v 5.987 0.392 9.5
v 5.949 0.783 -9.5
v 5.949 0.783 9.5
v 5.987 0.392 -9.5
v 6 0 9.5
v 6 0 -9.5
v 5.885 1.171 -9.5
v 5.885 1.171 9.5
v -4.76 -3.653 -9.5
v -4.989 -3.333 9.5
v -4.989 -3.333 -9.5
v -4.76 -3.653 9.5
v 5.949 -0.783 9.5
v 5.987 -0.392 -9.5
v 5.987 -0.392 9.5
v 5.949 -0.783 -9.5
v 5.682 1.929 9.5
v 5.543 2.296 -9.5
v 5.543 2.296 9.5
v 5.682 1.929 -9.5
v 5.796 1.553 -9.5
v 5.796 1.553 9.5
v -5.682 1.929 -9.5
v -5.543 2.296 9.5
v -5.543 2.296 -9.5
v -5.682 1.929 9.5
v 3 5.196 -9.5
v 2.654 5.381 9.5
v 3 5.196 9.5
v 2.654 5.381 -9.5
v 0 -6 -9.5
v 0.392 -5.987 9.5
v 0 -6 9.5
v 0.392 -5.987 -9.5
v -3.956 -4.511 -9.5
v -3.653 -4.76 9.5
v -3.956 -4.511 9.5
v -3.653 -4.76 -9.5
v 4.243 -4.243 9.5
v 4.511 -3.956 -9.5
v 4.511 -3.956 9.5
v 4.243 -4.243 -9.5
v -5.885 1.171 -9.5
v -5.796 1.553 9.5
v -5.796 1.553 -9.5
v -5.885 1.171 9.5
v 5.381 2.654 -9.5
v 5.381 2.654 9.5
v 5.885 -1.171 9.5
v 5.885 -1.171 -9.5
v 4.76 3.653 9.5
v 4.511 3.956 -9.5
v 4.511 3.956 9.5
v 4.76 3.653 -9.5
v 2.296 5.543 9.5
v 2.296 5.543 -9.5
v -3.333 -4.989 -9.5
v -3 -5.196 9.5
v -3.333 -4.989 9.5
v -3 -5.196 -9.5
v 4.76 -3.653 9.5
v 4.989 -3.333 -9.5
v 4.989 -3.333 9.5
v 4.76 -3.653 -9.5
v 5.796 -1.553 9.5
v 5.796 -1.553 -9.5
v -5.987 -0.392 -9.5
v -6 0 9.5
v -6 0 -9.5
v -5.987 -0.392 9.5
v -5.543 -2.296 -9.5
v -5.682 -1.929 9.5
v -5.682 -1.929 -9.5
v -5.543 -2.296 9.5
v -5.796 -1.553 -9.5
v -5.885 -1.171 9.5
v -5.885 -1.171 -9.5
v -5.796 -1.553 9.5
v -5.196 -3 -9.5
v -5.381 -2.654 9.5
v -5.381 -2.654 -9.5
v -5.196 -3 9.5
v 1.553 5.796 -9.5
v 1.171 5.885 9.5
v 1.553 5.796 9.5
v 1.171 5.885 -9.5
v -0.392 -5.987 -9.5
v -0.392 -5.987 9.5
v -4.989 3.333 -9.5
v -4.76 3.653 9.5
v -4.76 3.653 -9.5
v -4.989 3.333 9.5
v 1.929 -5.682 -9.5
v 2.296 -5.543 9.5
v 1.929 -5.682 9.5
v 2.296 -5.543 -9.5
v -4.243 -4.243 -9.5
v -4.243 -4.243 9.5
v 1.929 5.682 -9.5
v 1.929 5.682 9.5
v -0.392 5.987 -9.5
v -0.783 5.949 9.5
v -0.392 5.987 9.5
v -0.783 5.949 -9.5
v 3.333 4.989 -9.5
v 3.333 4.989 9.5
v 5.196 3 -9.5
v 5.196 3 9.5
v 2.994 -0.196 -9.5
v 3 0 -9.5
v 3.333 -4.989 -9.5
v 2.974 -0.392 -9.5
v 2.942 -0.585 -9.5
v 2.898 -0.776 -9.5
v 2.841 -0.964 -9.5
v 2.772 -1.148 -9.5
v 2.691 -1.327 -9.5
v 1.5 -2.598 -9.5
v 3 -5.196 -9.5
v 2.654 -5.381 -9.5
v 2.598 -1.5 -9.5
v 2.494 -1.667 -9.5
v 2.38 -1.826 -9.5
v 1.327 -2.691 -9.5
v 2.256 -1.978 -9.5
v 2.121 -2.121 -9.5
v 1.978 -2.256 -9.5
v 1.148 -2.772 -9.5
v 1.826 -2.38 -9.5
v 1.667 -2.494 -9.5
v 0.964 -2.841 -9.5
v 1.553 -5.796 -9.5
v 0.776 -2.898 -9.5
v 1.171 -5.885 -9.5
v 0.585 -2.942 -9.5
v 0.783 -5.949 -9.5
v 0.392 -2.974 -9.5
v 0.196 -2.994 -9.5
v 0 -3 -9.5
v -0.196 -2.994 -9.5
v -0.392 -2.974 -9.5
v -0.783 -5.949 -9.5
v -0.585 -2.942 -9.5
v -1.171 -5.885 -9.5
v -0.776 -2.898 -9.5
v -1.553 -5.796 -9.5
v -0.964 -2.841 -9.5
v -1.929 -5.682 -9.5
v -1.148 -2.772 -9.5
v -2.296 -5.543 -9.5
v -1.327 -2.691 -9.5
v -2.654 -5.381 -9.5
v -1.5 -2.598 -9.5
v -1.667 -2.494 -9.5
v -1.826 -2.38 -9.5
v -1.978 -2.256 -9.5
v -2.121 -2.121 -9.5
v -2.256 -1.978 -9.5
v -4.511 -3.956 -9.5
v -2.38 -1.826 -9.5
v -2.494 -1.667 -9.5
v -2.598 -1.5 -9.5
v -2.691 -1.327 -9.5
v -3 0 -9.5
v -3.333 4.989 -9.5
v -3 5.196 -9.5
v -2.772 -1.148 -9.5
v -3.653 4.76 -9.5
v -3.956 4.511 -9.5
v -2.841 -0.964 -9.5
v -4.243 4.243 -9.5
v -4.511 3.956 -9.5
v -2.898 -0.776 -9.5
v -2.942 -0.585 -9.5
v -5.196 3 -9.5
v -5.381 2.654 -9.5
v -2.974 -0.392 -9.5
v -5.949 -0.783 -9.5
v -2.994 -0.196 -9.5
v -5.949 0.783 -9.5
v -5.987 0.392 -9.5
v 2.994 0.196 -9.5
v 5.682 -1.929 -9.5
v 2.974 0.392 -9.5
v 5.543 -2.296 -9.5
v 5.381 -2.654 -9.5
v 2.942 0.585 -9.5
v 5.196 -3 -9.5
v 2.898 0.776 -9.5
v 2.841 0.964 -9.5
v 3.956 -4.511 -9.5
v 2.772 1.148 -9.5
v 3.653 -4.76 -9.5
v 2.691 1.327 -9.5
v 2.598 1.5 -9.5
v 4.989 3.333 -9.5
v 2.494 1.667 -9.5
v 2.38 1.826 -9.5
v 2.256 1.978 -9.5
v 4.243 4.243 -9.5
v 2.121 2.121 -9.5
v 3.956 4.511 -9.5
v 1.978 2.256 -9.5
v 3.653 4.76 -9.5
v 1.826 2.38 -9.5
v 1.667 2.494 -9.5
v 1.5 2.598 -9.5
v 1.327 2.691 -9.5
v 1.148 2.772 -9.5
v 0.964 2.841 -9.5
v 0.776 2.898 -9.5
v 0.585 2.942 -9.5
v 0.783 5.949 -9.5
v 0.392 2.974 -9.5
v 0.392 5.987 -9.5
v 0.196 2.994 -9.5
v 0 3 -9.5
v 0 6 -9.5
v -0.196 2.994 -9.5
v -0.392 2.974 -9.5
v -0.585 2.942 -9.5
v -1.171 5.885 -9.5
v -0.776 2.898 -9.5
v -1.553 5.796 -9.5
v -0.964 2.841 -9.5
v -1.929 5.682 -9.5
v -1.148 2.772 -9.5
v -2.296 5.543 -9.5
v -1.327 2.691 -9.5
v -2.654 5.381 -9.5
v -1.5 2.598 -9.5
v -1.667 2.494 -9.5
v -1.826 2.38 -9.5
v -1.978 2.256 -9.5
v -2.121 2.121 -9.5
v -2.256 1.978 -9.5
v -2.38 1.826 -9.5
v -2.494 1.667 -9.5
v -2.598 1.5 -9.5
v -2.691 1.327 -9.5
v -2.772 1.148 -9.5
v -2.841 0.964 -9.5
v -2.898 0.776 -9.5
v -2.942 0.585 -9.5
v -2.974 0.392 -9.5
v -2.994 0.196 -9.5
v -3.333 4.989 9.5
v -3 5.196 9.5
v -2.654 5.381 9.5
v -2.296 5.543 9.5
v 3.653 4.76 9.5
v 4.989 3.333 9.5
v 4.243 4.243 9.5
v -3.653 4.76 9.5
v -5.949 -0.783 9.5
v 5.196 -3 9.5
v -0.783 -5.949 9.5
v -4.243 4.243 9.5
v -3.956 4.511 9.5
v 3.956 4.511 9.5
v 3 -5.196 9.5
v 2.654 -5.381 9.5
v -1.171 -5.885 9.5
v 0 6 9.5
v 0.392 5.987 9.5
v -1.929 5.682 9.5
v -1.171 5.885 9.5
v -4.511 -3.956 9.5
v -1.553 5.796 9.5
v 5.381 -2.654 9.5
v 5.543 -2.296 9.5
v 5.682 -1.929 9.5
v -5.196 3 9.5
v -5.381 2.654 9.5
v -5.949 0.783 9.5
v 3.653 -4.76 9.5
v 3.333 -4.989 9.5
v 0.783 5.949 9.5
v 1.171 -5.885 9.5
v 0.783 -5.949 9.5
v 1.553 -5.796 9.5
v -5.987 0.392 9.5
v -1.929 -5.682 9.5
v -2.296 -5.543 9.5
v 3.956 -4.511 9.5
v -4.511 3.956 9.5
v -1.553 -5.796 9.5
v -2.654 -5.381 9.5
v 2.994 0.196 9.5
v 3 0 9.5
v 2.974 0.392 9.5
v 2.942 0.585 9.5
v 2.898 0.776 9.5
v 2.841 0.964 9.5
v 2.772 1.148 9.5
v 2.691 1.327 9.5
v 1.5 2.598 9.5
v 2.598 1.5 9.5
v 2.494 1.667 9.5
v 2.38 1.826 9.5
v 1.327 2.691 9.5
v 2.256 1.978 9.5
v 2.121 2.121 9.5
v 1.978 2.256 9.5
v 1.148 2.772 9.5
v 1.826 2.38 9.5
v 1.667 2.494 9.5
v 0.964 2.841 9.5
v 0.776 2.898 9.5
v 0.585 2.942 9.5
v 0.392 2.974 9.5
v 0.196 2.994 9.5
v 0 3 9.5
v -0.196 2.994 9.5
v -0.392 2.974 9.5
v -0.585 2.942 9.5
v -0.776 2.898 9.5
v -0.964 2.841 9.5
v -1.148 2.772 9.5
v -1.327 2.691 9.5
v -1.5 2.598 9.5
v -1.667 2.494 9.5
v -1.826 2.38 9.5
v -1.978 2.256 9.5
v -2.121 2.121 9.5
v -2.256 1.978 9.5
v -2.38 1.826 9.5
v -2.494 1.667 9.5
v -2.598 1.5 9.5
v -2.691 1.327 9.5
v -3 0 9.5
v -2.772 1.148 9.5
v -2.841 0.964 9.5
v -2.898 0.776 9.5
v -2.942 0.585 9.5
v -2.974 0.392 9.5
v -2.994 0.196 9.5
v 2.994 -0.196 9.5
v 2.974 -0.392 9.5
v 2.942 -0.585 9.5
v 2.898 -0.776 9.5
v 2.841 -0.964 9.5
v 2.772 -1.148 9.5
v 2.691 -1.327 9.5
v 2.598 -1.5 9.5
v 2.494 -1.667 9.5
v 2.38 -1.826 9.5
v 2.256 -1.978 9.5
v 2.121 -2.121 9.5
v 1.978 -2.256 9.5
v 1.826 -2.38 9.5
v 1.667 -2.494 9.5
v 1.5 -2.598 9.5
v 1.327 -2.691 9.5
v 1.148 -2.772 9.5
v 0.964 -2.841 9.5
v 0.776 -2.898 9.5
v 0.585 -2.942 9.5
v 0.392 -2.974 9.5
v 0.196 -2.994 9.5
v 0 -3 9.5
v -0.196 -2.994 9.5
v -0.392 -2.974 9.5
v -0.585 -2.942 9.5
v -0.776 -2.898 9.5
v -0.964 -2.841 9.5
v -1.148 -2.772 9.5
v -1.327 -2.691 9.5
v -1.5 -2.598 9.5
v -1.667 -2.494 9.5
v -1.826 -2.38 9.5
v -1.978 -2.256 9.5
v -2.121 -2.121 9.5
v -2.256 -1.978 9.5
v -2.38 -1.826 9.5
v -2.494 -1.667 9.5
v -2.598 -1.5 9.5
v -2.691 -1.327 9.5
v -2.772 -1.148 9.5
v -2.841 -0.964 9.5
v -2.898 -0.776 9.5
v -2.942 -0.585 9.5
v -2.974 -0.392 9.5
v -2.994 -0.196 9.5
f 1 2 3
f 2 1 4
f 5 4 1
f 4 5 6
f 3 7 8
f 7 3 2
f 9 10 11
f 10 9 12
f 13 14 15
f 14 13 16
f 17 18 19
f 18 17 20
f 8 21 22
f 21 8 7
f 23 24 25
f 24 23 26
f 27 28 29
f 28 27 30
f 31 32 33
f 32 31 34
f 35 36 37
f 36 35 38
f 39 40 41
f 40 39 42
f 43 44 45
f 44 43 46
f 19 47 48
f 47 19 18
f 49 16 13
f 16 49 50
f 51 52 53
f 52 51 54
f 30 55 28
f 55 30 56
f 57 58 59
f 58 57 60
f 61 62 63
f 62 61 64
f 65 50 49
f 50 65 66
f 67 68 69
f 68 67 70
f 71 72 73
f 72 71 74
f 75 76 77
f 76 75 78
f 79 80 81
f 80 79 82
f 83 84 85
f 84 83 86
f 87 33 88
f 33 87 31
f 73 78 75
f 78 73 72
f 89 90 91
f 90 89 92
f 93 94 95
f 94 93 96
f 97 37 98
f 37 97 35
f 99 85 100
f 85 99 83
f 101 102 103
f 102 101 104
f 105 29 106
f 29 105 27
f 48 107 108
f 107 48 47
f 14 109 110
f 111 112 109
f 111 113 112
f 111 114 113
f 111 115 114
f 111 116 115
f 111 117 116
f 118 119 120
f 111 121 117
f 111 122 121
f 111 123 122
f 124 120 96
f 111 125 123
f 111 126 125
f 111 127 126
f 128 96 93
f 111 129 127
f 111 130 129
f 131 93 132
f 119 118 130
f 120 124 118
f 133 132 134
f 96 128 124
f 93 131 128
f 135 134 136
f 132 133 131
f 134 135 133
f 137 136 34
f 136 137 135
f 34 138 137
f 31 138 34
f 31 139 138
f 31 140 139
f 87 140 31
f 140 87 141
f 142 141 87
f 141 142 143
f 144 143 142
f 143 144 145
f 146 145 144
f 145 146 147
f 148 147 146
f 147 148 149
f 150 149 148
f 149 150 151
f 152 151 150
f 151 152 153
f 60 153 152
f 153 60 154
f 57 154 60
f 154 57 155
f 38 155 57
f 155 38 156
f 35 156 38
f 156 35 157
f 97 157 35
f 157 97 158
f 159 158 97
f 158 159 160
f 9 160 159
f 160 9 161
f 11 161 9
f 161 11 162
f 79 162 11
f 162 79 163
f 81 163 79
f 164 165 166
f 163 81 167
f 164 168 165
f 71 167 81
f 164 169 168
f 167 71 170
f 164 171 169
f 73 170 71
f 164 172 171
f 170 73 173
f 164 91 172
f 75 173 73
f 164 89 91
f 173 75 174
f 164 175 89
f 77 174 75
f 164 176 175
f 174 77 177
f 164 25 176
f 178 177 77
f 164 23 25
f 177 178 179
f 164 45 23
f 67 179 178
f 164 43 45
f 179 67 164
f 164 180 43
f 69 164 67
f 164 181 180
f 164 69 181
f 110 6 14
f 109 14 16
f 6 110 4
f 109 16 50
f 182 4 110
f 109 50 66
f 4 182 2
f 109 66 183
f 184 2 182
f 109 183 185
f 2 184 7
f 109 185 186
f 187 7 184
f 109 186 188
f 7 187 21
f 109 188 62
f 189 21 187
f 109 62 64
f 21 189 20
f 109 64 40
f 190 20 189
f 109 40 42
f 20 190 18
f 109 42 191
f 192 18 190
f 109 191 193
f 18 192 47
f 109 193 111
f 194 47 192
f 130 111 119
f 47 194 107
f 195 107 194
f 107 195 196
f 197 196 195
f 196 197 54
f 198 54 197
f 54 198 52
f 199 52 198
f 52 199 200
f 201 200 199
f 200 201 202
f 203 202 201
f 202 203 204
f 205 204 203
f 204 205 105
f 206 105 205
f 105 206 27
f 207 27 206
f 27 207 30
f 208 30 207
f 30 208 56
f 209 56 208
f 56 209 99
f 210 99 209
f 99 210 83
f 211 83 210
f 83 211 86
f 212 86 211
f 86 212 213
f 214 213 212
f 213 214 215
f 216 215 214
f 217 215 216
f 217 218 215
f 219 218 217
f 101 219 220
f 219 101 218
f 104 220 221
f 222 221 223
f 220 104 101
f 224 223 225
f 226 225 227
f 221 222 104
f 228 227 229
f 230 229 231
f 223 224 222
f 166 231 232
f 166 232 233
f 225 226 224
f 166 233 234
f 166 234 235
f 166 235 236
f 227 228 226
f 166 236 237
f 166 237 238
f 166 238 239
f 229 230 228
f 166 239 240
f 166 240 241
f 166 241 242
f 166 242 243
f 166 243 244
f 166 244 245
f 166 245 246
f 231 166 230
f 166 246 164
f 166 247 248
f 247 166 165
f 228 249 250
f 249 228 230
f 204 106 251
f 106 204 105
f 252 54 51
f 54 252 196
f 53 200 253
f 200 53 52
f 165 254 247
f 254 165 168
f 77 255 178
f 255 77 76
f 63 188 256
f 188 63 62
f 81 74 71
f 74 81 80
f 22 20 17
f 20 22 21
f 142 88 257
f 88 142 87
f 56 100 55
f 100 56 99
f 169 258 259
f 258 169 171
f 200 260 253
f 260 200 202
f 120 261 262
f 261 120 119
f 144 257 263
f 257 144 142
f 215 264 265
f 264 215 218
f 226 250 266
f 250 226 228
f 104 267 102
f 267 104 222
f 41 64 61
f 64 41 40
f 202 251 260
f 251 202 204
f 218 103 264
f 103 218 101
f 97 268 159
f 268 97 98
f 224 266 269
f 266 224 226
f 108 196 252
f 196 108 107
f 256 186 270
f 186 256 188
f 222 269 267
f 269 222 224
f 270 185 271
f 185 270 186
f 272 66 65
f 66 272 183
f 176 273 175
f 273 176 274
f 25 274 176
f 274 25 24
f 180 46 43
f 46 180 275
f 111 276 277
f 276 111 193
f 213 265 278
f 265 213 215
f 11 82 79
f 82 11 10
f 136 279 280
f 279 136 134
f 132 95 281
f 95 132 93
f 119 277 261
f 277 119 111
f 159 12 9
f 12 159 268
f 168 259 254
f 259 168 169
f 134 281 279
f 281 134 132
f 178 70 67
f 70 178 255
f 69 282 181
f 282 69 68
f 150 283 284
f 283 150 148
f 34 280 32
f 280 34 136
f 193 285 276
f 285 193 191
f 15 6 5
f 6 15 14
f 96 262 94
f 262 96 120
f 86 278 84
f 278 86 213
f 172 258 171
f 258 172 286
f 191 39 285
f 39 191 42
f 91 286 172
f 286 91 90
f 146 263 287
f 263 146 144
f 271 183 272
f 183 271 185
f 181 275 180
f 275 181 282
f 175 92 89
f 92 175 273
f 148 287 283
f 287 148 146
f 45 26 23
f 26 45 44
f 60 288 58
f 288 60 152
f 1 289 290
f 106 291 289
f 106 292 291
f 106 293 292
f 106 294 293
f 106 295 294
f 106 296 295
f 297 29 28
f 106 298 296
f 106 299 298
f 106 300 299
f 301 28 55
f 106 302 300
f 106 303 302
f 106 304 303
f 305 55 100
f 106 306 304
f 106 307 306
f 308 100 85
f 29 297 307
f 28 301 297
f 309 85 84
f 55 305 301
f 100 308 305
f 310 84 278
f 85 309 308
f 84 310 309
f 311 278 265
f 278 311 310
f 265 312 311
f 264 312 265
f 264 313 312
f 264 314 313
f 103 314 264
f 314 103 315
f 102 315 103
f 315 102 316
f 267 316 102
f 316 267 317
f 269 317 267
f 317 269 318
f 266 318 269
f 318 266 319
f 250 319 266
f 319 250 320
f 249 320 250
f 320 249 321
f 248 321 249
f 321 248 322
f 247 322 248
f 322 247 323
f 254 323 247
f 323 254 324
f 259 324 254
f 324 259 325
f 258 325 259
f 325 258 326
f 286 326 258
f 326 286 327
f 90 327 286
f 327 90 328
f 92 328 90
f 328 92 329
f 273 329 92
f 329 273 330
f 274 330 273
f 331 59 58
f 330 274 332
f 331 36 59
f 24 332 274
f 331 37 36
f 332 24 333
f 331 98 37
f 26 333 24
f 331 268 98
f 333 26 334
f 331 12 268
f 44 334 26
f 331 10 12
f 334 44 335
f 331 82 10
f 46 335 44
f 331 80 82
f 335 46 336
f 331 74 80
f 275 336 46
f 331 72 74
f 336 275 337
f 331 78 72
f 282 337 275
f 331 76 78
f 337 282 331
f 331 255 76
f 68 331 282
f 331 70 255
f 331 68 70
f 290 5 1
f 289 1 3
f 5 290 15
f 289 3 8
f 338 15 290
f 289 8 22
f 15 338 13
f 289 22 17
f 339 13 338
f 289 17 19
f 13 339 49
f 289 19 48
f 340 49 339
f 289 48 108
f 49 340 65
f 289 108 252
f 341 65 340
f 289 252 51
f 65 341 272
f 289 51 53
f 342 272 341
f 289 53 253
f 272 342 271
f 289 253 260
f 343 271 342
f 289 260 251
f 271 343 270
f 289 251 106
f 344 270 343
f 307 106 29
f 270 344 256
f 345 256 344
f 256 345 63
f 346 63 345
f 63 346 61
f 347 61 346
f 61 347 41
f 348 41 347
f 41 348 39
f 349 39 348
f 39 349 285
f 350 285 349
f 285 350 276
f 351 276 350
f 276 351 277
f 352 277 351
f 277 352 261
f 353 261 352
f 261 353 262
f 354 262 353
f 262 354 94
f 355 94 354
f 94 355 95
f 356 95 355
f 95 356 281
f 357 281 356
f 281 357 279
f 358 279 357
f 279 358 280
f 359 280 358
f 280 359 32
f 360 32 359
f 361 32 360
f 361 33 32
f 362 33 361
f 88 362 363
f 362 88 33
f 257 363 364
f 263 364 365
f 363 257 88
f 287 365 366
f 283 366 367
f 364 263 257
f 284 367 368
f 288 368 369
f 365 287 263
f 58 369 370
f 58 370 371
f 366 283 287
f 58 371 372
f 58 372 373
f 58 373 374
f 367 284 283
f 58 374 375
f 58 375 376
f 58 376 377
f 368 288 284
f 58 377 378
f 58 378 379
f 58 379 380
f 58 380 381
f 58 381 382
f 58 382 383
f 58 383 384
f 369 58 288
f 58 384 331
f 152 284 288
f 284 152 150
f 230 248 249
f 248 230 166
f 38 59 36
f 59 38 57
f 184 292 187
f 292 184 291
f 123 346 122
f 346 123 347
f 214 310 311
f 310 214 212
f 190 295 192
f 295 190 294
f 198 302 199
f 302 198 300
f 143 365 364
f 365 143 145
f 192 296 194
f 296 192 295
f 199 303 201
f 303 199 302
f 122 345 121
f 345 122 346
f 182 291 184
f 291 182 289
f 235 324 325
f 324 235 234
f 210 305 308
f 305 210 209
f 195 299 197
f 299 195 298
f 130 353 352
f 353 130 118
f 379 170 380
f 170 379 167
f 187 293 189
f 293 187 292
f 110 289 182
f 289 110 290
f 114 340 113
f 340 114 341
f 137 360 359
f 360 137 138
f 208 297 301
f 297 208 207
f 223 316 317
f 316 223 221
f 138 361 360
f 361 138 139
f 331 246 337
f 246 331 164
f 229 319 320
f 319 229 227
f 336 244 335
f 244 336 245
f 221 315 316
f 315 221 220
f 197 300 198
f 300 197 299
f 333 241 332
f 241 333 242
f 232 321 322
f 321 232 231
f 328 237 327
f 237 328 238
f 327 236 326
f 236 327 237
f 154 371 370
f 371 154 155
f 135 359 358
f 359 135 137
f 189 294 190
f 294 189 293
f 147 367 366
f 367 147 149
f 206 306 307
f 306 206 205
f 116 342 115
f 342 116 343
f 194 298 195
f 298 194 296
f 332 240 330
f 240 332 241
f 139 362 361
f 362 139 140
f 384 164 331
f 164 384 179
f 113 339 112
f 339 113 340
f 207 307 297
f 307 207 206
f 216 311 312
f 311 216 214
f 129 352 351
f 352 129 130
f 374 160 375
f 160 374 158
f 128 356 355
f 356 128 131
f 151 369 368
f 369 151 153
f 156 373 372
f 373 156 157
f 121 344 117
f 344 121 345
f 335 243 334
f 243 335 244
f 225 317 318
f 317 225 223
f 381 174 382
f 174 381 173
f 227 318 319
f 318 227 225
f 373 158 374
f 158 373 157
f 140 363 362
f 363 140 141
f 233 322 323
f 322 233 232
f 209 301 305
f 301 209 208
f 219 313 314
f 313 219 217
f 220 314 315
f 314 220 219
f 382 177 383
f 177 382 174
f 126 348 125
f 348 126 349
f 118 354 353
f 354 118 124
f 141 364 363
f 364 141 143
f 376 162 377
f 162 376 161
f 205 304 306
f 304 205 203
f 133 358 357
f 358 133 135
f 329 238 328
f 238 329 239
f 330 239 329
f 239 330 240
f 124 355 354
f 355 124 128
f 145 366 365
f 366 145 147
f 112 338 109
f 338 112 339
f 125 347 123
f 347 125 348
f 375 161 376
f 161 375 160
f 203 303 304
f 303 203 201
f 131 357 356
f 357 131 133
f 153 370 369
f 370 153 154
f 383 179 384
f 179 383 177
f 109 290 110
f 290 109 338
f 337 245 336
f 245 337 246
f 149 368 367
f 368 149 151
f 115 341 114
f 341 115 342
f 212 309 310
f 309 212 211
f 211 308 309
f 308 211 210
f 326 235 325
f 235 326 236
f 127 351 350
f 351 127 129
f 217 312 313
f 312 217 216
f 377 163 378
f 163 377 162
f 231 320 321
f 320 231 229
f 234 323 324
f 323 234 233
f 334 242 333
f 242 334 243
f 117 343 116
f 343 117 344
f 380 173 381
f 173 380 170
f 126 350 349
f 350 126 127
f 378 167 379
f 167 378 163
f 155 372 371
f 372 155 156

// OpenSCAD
$fn=96;

bore_d = 6.0;
od_d = 12.0;
len = 19.0;

module linear_bearing(bore_d, od_d, len){
    difference(){
        cylinder(d=od_d, h=len, center=true);
        cylinder(d=bore_d, h=len+0.2, center=true);
    }
}

linear_bearing(bore_d, od_d, len);
